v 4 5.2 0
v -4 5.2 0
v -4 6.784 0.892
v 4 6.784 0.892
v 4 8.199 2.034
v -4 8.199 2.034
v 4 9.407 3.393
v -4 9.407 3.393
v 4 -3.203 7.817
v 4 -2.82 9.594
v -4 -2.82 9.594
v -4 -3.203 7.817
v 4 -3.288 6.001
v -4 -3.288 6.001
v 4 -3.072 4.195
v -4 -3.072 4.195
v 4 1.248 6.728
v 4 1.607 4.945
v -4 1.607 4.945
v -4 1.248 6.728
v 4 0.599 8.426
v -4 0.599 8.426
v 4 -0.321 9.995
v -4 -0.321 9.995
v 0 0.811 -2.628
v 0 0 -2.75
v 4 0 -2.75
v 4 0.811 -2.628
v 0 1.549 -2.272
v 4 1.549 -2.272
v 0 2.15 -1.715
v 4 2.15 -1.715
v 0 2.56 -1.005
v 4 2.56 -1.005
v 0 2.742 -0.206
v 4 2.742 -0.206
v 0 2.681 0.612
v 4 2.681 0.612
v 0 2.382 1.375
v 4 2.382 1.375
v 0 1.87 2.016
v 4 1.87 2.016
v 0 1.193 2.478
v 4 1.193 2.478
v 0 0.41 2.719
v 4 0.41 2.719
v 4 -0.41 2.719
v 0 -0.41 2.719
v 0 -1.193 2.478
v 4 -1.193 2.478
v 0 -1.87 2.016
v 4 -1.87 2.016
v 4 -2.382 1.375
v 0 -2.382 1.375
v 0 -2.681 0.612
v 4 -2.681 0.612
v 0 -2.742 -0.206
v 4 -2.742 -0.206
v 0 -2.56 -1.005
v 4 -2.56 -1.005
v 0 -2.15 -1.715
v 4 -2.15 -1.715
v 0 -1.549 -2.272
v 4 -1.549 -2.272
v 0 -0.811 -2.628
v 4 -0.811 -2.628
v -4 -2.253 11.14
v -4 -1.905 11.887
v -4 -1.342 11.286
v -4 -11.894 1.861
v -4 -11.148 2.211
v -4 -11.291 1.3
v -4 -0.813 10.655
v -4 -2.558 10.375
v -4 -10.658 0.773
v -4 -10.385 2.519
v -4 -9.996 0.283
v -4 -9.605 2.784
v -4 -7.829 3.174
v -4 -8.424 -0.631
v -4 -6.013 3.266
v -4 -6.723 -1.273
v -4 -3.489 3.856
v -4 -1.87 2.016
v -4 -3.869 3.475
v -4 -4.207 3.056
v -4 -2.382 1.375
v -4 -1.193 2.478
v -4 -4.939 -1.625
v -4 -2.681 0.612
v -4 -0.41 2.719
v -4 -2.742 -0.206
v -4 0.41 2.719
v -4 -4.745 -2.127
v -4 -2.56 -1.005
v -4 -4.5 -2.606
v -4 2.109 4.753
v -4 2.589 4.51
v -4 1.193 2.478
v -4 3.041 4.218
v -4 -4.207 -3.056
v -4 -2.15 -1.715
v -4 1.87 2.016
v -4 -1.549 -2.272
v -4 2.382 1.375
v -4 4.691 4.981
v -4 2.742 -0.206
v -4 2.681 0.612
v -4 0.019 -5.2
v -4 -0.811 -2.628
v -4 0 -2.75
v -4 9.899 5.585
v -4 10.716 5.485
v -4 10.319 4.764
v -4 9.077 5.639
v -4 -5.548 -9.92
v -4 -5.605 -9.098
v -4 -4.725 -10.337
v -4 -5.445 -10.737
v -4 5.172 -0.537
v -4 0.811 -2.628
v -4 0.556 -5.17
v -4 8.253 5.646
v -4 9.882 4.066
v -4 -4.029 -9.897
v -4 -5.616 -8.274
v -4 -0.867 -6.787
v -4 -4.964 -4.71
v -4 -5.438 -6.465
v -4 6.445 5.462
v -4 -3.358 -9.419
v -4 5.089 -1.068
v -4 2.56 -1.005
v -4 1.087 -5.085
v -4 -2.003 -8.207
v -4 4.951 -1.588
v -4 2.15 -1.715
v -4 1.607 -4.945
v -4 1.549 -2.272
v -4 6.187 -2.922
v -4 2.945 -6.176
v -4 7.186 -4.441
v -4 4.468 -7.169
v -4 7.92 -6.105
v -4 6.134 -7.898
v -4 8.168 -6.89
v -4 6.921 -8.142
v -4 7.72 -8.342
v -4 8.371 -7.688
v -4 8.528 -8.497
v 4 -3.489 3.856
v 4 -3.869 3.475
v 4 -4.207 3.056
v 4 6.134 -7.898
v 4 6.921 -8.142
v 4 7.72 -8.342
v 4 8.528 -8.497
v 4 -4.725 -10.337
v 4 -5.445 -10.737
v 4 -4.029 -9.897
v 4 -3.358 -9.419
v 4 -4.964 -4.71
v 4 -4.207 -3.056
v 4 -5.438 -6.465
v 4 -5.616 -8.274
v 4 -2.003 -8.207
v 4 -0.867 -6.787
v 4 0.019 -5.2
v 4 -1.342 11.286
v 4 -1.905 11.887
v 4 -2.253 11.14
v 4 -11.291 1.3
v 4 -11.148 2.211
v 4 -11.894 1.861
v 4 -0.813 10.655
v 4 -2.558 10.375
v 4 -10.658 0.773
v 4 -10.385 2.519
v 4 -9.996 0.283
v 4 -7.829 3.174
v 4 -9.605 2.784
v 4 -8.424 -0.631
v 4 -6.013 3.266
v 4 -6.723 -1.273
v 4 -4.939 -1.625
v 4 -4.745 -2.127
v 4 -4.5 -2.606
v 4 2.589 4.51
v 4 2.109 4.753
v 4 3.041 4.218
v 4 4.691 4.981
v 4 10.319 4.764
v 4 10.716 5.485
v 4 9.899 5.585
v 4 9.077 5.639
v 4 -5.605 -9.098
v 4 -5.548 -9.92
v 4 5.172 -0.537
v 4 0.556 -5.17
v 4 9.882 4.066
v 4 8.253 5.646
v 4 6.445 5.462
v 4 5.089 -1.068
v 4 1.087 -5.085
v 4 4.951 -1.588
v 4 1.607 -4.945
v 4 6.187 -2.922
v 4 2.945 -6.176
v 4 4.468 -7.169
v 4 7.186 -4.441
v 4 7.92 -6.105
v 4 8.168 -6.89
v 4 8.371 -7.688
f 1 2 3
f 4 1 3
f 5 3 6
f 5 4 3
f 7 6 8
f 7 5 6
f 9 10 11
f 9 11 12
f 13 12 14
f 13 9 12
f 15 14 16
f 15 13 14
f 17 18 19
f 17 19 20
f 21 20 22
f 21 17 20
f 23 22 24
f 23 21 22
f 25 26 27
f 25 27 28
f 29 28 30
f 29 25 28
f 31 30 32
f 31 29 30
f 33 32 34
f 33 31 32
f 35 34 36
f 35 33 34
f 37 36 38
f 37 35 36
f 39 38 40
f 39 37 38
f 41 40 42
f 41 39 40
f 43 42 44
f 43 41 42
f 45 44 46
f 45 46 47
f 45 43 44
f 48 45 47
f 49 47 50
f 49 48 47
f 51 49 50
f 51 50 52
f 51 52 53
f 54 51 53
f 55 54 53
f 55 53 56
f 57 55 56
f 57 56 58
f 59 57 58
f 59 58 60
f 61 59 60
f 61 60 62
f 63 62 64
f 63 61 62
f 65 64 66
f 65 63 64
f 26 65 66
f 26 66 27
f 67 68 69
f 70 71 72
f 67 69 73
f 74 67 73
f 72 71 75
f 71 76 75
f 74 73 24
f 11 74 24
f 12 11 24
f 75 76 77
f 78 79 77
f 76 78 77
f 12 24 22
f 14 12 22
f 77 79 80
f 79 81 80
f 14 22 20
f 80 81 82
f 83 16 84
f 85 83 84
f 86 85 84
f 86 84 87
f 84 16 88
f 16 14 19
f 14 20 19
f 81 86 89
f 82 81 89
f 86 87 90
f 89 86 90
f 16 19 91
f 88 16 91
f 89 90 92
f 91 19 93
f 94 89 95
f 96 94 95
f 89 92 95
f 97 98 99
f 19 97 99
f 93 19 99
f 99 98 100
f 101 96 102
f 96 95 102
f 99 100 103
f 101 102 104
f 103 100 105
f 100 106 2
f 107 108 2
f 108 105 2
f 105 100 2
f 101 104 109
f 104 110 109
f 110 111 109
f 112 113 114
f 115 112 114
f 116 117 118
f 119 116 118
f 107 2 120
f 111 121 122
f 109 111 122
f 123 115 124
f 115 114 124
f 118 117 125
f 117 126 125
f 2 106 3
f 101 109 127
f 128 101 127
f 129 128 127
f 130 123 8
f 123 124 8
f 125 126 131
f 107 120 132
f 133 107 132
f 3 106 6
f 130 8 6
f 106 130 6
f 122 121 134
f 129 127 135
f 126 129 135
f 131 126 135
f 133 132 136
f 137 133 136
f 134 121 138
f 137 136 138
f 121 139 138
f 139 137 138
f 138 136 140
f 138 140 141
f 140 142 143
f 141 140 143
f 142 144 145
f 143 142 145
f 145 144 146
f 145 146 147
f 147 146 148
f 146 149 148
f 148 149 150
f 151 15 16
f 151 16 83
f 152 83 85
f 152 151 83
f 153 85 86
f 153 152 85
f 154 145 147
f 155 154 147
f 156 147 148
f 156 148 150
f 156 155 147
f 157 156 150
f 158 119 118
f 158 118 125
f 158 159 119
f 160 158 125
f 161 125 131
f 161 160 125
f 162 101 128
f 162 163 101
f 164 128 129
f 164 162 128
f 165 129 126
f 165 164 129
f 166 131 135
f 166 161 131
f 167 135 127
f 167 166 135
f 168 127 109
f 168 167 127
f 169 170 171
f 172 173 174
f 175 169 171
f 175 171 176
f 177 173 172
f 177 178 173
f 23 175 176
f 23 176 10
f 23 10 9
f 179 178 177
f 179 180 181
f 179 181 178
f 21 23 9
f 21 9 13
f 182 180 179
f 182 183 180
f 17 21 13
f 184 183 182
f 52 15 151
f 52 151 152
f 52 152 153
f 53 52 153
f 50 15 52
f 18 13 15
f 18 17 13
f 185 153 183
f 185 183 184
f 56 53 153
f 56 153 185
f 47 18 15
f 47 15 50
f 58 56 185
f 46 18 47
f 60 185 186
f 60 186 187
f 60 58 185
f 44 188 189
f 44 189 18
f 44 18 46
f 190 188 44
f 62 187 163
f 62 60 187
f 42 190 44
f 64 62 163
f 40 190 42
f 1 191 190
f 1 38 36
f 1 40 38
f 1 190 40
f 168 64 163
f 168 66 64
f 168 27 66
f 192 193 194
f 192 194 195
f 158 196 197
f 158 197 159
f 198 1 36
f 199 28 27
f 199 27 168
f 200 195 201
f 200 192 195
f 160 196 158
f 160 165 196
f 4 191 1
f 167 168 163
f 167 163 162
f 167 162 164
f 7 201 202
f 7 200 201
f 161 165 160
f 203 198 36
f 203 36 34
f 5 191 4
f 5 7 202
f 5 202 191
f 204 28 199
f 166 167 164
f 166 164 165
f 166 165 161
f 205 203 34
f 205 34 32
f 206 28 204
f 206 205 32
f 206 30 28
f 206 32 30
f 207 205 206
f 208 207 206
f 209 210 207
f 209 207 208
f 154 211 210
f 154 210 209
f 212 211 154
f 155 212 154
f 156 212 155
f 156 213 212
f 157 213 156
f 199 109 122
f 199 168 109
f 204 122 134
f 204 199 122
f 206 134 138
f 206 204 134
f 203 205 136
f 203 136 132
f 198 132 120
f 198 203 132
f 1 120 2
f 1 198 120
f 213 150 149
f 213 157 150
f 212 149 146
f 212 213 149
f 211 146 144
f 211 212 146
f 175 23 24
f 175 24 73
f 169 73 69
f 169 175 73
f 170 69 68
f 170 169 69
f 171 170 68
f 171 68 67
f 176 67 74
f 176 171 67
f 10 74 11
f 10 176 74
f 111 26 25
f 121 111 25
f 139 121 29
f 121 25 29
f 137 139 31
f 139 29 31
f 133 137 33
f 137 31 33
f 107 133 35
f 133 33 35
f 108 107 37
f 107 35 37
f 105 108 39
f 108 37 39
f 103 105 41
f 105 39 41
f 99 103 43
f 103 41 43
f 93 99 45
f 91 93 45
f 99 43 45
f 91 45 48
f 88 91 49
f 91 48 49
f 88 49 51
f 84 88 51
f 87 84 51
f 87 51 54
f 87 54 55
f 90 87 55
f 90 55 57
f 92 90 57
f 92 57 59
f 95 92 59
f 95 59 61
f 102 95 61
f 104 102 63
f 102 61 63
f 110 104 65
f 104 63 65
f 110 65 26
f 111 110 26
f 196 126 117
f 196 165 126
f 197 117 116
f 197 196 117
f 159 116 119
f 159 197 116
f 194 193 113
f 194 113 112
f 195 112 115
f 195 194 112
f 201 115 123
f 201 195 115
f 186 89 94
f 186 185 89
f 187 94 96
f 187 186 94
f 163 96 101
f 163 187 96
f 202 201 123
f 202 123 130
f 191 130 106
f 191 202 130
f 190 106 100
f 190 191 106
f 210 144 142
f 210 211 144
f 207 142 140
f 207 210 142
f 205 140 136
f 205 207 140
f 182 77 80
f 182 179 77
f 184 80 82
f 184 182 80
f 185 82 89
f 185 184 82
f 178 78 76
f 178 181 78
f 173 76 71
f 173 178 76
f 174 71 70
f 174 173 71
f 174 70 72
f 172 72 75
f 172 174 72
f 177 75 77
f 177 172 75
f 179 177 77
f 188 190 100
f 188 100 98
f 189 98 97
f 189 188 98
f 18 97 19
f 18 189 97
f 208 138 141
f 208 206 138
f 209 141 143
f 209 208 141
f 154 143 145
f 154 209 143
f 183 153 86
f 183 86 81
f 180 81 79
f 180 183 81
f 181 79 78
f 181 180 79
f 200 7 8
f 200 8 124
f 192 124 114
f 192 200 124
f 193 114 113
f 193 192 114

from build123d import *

# Parameters (mm, degrees)
BOSS_EXTRUDE1_DEPTH      = 4
BOSS_EXTRUDE1_DEPTH_BACK = 4
SKETCH1_R                = 2.75


with BuildPart() as part:
    # Sketch1 → Boss-Extrude1 (new, two sides: drawn at the far end of the back side and taken through both)
    with BuildSketch(Plane(origin=(0, 0, 0), x_dir=(0, 0, -1), z_dir=(1, 0, 0)).offset(-BOSS_EXTRUDE1_DEPTH_BACK)):
        with BuildLine():
            ThreePointArc((6.104566947, 7.920496348), (3.660962149, 6.718169615), (1.588390796, 4.951465912))
            ThreePointArc((1.588390796, 4.951465912), (0.803858587, 5.137490766), (0, 5.2))
            ThreePointArc((0, 5.2), (-1.433855865, 7.515351235), (-3.393406085, 9.406635697))
            ThreePointArc((-3.393406085, 9.406635697), (-4.411888917, 10.105404063), (-5.485434516, 10.716210377))
            ThreePointArc((-5.485434516, 10.716210377), (-5.617706577, 9.488167784), (-5.646424734, 8.253356149))
            ThreePointArc((-5.646424734, 8.253356149), (-5.25805947, 5.557810489), (-4.218284171, 3.040736531))
            ThreePointArc((-4.218284171, 3.040736531), (-4.637638106, 2.352086903), (-4.945493885, 1.606888371))
            ThreePointArc((-4.945493885, 1.606888371), (-7.590609594, 0.958693286), (-9.994862325, -0.32051068))
            ThreePointArc((-9.994862325, -0.32051068), (-10.974159037, -1.073214113), (-11.886814196, -1.90546712))
            ThreePointArc((-11.886814196, -1.90546712), (-10.759750601, -2.410751356), (-9.594249347, -2.819641726))
            ThreePointArc((-9.594249347, -2.819641726), (-6.910621616, -3.283253829), (-4.195433788, -3.072187385))
            ThreePointArc((-4.195433788, -3.072187385), (-3.670076564, -3.683821116), (-3.056483312, -4.206888371))
            ThreePointArc((-3.056483312, -4.206888371), (-3.257398859, -6.922846199), (-2.783758545, -9.604722191))
            ThreePointArc((-2.783758545, -9.604722191), (-2.370514366, -10.768686862), (-1.861020675, -11.893853821))
            ThreePointArc((-1.861020675, -11.893853821), (-1.032185004, -10.978094061), (-0.283147459, -9.995990572))
            ThreePointArc((-0.283147459, -9.995990572), (0.987060428, -7.586972949), (1.625363492, -4.939452755))
            ThreePointArc((1.625363492, -4.939452755), (2.369406048, -4.628813561), (3.056483312, -4.206888371))
            ThreePointArc((3.056483312, -4.206888371), (5.577426384, -5.237247536), (8.274404928, -5.615534087))
            ThreePointArc((8.274404928, -5.615534087), (9.509100588, -5.582200382), (10.736640165, -5.445338799))
            ThreePointArc((10.736640165, -5.445338799), (10.121825185, -4.374083905), (9.419254594, -3.358220198))
            ThreePointArc((9.419254594, -3.358220198), (7.520658509, -1.405753325), (5.199963671, 0.019437697))
            ThreePointArc((5.199963671, 0.019437697), (5.134450035, 0.823057007), (4.945493885, 1.606888371))
            ThreePointArc((4.945493885, 1.606888371), (6.704437934, 3.686049214), (7.897622027, 6.13413126))
            ThreePointArc((7.897622027, 6.13413126), (8.247461732, 7.318697294), (8.496629222, 8.528449363))
            ThreePointArc((8.496629222, 8.528449363), (7.287816997, 8.274761538), (6.104566947, 7.920496348))
        make_face()
        Circle(SKETCH1_R, mode=Mode.SUBTRACT)
    extrude(amount=BOSS_EXTRUDE1_DEPTH + BOSS_EXTRUDE1_DEPTH_BACK)


solid = part.part
